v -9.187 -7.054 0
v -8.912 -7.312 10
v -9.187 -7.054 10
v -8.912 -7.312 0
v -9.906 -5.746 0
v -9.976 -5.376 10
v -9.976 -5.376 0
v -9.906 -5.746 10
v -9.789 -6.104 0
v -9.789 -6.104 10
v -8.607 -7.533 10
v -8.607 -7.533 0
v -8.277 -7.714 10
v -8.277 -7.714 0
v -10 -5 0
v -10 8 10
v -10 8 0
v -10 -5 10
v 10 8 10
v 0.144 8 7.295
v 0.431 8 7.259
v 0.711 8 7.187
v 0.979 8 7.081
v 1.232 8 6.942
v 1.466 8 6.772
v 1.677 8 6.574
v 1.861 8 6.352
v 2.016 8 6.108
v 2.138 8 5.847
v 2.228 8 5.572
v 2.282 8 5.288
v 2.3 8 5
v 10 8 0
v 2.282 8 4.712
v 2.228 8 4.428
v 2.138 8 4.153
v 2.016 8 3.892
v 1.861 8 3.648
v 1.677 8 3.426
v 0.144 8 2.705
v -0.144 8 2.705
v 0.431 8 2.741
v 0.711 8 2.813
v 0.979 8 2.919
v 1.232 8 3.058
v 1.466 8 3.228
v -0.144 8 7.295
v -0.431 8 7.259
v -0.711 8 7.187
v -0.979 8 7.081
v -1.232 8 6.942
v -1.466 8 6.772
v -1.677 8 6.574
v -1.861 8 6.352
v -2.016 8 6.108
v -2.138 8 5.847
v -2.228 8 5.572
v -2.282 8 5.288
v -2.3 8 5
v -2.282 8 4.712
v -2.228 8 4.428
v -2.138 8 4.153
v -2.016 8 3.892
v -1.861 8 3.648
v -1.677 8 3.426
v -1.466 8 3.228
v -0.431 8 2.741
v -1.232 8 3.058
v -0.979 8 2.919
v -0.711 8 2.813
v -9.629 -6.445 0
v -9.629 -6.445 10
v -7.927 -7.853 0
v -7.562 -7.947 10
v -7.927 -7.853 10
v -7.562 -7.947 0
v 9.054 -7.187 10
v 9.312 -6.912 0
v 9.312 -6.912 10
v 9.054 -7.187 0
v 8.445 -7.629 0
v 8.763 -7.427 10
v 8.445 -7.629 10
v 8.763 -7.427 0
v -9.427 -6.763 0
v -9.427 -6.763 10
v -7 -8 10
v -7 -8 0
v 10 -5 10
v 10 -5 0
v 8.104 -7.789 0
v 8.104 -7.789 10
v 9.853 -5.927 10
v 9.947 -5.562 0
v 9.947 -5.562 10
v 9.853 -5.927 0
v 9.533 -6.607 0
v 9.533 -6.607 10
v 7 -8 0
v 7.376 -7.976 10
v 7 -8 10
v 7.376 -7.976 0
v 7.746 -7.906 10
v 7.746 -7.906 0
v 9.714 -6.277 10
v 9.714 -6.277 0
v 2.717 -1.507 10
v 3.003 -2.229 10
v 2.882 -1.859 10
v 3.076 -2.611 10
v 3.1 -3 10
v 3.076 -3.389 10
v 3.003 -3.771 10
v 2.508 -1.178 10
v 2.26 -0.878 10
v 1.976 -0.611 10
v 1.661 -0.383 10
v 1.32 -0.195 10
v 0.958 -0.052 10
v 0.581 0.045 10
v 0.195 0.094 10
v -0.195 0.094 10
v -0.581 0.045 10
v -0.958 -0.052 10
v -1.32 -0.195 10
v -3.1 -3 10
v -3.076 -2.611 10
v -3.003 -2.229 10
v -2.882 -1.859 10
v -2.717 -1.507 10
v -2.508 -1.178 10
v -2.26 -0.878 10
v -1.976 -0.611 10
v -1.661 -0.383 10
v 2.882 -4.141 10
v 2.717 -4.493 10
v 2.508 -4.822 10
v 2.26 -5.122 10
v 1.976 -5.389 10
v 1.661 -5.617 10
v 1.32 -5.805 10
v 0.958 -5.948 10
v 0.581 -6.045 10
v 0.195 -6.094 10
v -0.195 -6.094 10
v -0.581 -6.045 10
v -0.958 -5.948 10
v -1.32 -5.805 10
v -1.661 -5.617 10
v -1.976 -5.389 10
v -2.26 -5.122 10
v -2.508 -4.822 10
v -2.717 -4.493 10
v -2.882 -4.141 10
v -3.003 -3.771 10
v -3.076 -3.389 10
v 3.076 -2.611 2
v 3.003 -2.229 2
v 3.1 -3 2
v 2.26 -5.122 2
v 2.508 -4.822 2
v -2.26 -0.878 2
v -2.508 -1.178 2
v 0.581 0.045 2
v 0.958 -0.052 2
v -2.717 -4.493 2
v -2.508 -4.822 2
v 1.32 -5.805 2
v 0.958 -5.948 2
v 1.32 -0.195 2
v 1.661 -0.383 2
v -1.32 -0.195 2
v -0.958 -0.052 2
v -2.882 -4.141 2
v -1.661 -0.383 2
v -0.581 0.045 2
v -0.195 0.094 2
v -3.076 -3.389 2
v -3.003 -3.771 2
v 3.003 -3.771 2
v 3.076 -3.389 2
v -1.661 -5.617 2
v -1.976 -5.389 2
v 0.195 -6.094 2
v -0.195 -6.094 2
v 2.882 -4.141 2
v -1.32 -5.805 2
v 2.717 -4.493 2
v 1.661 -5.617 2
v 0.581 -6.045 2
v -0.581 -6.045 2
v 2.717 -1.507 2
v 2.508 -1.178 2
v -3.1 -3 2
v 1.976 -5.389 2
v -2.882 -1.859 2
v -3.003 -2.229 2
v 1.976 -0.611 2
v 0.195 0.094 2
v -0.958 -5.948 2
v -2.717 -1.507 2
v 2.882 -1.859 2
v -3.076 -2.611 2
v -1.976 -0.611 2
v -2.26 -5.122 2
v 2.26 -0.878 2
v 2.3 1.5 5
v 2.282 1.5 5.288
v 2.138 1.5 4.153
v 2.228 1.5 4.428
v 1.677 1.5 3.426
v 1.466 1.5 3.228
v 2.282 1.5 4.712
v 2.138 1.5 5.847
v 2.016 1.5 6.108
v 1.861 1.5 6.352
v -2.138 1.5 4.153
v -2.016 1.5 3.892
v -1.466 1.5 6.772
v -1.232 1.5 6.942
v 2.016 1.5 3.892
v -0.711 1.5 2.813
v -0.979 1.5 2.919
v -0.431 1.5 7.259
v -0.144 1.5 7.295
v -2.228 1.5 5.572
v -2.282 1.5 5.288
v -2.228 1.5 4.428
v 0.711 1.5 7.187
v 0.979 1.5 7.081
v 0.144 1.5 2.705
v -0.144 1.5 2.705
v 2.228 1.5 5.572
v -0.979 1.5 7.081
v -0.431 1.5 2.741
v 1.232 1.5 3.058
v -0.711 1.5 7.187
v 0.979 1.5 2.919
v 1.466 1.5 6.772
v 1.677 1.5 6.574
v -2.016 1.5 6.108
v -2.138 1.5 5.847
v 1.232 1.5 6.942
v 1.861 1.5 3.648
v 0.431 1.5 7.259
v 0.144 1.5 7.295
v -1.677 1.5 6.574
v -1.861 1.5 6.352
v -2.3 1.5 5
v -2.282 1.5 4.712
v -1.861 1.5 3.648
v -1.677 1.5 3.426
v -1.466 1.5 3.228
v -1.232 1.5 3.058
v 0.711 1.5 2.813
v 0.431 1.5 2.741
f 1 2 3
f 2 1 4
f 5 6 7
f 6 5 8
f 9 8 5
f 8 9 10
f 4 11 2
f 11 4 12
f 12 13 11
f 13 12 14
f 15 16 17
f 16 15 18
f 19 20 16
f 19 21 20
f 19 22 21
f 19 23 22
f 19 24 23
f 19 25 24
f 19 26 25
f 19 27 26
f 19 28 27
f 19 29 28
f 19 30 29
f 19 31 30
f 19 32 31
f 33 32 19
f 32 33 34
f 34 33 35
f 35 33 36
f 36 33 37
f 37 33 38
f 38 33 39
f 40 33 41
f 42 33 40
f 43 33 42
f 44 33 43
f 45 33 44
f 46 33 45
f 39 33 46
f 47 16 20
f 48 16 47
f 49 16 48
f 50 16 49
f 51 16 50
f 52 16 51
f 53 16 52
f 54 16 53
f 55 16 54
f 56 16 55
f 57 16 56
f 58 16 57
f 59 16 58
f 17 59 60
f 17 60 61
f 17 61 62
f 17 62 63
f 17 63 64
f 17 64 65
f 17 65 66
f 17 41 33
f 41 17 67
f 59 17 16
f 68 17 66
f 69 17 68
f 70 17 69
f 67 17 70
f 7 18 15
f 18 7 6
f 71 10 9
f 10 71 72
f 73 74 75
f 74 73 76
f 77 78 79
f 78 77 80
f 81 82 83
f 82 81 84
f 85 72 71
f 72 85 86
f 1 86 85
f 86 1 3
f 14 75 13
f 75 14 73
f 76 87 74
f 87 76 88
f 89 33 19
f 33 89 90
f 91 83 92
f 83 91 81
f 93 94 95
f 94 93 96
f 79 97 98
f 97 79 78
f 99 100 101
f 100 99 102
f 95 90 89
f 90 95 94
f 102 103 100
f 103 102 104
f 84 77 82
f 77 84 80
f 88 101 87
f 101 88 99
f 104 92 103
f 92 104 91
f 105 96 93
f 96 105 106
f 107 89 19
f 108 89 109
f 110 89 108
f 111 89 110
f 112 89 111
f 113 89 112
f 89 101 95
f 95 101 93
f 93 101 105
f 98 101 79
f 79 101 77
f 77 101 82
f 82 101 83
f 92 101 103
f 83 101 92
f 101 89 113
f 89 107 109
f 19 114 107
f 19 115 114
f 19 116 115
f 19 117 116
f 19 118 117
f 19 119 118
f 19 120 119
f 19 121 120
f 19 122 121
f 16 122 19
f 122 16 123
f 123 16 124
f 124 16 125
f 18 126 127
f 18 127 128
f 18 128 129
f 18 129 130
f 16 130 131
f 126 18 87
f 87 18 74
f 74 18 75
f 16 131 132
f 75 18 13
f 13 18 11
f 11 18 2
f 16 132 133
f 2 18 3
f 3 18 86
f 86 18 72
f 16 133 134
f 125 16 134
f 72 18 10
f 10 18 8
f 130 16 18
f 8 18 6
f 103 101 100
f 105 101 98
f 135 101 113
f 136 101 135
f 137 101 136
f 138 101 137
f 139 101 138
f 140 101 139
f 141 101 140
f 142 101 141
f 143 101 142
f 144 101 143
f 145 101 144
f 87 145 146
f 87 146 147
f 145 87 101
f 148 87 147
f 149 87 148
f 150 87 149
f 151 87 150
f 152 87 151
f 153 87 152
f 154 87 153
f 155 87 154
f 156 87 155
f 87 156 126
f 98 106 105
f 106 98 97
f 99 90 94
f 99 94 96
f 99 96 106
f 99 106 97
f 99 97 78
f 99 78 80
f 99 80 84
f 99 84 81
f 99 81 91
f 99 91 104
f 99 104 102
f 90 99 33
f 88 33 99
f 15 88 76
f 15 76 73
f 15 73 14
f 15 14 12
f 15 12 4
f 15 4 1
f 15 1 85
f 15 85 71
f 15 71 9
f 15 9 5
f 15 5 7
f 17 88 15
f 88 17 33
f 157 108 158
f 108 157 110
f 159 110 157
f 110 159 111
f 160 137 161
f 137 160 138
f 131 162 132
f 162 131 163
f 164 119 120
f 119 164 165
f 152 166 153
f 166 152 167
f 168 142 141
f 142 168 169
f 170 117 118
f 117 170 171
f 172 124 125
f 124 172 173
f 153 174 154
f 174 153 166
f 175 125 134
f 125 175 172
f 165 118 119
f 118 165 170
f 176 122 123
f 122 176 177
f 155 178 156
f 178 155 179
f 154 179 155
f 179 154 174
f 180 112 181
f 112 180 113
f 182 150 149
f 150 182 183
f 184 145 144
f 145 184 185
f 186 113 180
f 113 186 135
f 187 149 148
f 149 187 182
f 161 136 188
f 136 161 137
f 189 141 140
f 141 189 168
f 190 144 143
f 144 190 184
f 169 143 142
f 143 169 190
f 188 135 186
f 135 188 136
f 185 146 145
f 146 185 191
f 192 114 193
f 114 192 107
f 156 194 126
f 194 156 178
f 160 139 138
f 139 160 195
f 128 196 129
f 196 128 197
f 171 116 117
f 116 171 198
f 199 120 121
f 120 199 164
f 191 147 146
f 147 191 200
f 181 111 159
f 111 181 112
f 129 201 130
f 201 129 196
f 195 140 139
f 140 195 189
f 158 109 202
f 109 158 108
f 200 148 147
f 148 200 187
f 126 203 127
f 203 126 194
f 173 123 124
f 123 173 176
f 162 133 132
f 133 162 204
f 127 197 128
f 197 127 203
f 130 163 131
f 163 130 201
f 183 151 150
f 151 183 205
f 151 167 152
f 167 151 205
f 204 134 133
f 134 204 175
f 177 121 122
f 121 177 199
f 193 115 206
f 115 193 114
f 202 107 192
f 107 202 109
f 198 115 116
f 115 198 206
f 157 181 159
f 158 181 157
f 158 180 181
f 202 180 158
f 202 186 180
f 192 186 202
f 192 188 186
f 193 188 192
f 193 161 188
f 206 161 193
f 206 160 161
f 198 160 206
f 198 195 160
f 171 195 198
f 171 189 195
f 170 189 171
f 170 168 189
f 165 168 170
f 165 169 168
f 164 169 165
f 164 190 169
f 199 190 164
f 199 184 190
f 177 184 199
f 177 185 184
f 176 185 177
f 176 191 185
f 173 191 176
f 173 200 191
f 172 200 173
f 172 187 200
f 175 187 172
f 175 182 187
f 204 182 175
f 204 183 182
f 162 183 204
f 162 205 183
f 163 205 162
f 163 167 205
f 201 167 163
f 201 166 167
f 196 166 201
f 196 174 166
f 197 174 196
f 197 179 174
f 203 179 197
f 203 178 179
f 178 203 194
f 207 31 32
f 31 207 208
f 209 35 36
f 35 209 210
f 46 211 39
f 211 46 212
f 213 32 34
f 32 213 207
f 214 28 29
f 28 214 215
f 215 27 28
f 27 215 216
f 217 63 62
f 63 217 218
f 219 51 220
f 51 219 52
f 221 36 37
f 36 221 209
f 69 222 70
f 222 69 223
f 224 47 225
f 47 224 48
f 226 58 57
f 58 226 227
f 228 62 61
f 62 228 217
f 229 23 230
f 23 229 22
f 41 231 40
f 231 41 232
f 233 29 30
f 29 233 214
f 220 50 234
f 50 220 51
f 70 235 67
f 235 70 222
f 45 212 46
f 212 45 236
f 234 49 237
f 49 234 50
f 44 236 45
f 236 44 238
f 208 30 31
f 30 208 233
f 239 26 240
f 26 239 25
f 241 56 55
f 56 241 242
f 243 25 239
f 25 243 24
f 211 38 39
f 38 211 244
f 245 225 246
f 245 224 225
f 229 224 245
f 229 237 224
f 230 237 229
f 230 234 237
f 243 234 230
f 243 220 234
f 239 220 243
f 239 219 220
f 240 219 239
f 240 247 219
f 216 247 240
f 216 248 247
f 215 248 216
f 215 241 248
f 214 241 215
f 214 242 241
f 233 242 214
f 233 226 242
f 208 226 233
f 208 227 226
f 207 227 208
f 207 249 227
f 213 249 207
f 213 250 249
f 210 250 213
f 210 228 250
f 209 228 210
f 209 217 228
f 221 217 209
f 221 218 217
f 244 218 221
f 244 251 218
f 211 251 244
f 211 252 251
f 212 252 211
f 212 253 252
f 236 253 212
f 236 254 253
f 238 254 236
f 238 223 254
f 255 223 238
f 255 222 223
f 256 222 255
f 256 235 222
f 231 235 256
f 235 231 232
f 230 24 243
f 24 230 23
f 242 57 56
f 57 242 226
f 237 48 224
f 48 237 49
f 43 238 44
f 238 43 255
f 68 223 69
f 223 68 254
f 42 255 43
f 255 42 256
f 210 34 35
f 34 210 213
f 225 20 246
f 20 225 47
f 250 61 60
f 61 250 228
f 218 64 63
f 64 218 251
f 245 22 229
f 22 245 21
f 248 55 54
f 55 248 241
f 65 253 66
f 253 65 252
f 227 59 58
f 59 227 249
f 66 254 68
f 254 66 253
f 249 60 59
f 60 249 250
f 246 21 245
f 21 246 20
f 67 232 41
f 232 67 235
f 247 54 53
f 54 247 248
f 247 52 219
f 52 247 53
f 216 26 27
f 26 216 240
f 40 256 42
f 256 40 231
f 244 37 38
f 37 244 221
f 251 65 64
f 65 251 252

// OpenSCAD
$fn=50;
width = 20;
length = 16;
height = 10;
rail_hole_diameter = 6.2;
rail_hole_offset = -((16 - 10) / 2);
screw_size = 4.6;

module fillet(r) {
   offset(r = r) {
     offset(r = -r) {
       children();
     }
   }
}


module screw_hole(x, y, depth, d ) {
    translate([x, y, -0.5]){
        linear_extrude(depth) {
            circle(d=d);
        }
    }
}

module outer_shell() {
    linear_extrude(height) {
        translate([0, length/4, 0]) {
            square([width, length/2], true);
        }
        fillet(3) {
            square([width, length], center=true);
        }
    }
}


module rail_hole() {
    translate([0, rail_hole_offset, 2]) {
        linear_extrude(height) {
            circle(d=rail_hole_diameter);
        }
    }
}


union() {
    difference() {
        outer_shell();
        rail_hole();
        translate([0, length/2, 0]) {
            rotate([90, 0, 0]) {
                screw_hole(0, height/2, 7, screw_size);
            }
        }
    }
}
